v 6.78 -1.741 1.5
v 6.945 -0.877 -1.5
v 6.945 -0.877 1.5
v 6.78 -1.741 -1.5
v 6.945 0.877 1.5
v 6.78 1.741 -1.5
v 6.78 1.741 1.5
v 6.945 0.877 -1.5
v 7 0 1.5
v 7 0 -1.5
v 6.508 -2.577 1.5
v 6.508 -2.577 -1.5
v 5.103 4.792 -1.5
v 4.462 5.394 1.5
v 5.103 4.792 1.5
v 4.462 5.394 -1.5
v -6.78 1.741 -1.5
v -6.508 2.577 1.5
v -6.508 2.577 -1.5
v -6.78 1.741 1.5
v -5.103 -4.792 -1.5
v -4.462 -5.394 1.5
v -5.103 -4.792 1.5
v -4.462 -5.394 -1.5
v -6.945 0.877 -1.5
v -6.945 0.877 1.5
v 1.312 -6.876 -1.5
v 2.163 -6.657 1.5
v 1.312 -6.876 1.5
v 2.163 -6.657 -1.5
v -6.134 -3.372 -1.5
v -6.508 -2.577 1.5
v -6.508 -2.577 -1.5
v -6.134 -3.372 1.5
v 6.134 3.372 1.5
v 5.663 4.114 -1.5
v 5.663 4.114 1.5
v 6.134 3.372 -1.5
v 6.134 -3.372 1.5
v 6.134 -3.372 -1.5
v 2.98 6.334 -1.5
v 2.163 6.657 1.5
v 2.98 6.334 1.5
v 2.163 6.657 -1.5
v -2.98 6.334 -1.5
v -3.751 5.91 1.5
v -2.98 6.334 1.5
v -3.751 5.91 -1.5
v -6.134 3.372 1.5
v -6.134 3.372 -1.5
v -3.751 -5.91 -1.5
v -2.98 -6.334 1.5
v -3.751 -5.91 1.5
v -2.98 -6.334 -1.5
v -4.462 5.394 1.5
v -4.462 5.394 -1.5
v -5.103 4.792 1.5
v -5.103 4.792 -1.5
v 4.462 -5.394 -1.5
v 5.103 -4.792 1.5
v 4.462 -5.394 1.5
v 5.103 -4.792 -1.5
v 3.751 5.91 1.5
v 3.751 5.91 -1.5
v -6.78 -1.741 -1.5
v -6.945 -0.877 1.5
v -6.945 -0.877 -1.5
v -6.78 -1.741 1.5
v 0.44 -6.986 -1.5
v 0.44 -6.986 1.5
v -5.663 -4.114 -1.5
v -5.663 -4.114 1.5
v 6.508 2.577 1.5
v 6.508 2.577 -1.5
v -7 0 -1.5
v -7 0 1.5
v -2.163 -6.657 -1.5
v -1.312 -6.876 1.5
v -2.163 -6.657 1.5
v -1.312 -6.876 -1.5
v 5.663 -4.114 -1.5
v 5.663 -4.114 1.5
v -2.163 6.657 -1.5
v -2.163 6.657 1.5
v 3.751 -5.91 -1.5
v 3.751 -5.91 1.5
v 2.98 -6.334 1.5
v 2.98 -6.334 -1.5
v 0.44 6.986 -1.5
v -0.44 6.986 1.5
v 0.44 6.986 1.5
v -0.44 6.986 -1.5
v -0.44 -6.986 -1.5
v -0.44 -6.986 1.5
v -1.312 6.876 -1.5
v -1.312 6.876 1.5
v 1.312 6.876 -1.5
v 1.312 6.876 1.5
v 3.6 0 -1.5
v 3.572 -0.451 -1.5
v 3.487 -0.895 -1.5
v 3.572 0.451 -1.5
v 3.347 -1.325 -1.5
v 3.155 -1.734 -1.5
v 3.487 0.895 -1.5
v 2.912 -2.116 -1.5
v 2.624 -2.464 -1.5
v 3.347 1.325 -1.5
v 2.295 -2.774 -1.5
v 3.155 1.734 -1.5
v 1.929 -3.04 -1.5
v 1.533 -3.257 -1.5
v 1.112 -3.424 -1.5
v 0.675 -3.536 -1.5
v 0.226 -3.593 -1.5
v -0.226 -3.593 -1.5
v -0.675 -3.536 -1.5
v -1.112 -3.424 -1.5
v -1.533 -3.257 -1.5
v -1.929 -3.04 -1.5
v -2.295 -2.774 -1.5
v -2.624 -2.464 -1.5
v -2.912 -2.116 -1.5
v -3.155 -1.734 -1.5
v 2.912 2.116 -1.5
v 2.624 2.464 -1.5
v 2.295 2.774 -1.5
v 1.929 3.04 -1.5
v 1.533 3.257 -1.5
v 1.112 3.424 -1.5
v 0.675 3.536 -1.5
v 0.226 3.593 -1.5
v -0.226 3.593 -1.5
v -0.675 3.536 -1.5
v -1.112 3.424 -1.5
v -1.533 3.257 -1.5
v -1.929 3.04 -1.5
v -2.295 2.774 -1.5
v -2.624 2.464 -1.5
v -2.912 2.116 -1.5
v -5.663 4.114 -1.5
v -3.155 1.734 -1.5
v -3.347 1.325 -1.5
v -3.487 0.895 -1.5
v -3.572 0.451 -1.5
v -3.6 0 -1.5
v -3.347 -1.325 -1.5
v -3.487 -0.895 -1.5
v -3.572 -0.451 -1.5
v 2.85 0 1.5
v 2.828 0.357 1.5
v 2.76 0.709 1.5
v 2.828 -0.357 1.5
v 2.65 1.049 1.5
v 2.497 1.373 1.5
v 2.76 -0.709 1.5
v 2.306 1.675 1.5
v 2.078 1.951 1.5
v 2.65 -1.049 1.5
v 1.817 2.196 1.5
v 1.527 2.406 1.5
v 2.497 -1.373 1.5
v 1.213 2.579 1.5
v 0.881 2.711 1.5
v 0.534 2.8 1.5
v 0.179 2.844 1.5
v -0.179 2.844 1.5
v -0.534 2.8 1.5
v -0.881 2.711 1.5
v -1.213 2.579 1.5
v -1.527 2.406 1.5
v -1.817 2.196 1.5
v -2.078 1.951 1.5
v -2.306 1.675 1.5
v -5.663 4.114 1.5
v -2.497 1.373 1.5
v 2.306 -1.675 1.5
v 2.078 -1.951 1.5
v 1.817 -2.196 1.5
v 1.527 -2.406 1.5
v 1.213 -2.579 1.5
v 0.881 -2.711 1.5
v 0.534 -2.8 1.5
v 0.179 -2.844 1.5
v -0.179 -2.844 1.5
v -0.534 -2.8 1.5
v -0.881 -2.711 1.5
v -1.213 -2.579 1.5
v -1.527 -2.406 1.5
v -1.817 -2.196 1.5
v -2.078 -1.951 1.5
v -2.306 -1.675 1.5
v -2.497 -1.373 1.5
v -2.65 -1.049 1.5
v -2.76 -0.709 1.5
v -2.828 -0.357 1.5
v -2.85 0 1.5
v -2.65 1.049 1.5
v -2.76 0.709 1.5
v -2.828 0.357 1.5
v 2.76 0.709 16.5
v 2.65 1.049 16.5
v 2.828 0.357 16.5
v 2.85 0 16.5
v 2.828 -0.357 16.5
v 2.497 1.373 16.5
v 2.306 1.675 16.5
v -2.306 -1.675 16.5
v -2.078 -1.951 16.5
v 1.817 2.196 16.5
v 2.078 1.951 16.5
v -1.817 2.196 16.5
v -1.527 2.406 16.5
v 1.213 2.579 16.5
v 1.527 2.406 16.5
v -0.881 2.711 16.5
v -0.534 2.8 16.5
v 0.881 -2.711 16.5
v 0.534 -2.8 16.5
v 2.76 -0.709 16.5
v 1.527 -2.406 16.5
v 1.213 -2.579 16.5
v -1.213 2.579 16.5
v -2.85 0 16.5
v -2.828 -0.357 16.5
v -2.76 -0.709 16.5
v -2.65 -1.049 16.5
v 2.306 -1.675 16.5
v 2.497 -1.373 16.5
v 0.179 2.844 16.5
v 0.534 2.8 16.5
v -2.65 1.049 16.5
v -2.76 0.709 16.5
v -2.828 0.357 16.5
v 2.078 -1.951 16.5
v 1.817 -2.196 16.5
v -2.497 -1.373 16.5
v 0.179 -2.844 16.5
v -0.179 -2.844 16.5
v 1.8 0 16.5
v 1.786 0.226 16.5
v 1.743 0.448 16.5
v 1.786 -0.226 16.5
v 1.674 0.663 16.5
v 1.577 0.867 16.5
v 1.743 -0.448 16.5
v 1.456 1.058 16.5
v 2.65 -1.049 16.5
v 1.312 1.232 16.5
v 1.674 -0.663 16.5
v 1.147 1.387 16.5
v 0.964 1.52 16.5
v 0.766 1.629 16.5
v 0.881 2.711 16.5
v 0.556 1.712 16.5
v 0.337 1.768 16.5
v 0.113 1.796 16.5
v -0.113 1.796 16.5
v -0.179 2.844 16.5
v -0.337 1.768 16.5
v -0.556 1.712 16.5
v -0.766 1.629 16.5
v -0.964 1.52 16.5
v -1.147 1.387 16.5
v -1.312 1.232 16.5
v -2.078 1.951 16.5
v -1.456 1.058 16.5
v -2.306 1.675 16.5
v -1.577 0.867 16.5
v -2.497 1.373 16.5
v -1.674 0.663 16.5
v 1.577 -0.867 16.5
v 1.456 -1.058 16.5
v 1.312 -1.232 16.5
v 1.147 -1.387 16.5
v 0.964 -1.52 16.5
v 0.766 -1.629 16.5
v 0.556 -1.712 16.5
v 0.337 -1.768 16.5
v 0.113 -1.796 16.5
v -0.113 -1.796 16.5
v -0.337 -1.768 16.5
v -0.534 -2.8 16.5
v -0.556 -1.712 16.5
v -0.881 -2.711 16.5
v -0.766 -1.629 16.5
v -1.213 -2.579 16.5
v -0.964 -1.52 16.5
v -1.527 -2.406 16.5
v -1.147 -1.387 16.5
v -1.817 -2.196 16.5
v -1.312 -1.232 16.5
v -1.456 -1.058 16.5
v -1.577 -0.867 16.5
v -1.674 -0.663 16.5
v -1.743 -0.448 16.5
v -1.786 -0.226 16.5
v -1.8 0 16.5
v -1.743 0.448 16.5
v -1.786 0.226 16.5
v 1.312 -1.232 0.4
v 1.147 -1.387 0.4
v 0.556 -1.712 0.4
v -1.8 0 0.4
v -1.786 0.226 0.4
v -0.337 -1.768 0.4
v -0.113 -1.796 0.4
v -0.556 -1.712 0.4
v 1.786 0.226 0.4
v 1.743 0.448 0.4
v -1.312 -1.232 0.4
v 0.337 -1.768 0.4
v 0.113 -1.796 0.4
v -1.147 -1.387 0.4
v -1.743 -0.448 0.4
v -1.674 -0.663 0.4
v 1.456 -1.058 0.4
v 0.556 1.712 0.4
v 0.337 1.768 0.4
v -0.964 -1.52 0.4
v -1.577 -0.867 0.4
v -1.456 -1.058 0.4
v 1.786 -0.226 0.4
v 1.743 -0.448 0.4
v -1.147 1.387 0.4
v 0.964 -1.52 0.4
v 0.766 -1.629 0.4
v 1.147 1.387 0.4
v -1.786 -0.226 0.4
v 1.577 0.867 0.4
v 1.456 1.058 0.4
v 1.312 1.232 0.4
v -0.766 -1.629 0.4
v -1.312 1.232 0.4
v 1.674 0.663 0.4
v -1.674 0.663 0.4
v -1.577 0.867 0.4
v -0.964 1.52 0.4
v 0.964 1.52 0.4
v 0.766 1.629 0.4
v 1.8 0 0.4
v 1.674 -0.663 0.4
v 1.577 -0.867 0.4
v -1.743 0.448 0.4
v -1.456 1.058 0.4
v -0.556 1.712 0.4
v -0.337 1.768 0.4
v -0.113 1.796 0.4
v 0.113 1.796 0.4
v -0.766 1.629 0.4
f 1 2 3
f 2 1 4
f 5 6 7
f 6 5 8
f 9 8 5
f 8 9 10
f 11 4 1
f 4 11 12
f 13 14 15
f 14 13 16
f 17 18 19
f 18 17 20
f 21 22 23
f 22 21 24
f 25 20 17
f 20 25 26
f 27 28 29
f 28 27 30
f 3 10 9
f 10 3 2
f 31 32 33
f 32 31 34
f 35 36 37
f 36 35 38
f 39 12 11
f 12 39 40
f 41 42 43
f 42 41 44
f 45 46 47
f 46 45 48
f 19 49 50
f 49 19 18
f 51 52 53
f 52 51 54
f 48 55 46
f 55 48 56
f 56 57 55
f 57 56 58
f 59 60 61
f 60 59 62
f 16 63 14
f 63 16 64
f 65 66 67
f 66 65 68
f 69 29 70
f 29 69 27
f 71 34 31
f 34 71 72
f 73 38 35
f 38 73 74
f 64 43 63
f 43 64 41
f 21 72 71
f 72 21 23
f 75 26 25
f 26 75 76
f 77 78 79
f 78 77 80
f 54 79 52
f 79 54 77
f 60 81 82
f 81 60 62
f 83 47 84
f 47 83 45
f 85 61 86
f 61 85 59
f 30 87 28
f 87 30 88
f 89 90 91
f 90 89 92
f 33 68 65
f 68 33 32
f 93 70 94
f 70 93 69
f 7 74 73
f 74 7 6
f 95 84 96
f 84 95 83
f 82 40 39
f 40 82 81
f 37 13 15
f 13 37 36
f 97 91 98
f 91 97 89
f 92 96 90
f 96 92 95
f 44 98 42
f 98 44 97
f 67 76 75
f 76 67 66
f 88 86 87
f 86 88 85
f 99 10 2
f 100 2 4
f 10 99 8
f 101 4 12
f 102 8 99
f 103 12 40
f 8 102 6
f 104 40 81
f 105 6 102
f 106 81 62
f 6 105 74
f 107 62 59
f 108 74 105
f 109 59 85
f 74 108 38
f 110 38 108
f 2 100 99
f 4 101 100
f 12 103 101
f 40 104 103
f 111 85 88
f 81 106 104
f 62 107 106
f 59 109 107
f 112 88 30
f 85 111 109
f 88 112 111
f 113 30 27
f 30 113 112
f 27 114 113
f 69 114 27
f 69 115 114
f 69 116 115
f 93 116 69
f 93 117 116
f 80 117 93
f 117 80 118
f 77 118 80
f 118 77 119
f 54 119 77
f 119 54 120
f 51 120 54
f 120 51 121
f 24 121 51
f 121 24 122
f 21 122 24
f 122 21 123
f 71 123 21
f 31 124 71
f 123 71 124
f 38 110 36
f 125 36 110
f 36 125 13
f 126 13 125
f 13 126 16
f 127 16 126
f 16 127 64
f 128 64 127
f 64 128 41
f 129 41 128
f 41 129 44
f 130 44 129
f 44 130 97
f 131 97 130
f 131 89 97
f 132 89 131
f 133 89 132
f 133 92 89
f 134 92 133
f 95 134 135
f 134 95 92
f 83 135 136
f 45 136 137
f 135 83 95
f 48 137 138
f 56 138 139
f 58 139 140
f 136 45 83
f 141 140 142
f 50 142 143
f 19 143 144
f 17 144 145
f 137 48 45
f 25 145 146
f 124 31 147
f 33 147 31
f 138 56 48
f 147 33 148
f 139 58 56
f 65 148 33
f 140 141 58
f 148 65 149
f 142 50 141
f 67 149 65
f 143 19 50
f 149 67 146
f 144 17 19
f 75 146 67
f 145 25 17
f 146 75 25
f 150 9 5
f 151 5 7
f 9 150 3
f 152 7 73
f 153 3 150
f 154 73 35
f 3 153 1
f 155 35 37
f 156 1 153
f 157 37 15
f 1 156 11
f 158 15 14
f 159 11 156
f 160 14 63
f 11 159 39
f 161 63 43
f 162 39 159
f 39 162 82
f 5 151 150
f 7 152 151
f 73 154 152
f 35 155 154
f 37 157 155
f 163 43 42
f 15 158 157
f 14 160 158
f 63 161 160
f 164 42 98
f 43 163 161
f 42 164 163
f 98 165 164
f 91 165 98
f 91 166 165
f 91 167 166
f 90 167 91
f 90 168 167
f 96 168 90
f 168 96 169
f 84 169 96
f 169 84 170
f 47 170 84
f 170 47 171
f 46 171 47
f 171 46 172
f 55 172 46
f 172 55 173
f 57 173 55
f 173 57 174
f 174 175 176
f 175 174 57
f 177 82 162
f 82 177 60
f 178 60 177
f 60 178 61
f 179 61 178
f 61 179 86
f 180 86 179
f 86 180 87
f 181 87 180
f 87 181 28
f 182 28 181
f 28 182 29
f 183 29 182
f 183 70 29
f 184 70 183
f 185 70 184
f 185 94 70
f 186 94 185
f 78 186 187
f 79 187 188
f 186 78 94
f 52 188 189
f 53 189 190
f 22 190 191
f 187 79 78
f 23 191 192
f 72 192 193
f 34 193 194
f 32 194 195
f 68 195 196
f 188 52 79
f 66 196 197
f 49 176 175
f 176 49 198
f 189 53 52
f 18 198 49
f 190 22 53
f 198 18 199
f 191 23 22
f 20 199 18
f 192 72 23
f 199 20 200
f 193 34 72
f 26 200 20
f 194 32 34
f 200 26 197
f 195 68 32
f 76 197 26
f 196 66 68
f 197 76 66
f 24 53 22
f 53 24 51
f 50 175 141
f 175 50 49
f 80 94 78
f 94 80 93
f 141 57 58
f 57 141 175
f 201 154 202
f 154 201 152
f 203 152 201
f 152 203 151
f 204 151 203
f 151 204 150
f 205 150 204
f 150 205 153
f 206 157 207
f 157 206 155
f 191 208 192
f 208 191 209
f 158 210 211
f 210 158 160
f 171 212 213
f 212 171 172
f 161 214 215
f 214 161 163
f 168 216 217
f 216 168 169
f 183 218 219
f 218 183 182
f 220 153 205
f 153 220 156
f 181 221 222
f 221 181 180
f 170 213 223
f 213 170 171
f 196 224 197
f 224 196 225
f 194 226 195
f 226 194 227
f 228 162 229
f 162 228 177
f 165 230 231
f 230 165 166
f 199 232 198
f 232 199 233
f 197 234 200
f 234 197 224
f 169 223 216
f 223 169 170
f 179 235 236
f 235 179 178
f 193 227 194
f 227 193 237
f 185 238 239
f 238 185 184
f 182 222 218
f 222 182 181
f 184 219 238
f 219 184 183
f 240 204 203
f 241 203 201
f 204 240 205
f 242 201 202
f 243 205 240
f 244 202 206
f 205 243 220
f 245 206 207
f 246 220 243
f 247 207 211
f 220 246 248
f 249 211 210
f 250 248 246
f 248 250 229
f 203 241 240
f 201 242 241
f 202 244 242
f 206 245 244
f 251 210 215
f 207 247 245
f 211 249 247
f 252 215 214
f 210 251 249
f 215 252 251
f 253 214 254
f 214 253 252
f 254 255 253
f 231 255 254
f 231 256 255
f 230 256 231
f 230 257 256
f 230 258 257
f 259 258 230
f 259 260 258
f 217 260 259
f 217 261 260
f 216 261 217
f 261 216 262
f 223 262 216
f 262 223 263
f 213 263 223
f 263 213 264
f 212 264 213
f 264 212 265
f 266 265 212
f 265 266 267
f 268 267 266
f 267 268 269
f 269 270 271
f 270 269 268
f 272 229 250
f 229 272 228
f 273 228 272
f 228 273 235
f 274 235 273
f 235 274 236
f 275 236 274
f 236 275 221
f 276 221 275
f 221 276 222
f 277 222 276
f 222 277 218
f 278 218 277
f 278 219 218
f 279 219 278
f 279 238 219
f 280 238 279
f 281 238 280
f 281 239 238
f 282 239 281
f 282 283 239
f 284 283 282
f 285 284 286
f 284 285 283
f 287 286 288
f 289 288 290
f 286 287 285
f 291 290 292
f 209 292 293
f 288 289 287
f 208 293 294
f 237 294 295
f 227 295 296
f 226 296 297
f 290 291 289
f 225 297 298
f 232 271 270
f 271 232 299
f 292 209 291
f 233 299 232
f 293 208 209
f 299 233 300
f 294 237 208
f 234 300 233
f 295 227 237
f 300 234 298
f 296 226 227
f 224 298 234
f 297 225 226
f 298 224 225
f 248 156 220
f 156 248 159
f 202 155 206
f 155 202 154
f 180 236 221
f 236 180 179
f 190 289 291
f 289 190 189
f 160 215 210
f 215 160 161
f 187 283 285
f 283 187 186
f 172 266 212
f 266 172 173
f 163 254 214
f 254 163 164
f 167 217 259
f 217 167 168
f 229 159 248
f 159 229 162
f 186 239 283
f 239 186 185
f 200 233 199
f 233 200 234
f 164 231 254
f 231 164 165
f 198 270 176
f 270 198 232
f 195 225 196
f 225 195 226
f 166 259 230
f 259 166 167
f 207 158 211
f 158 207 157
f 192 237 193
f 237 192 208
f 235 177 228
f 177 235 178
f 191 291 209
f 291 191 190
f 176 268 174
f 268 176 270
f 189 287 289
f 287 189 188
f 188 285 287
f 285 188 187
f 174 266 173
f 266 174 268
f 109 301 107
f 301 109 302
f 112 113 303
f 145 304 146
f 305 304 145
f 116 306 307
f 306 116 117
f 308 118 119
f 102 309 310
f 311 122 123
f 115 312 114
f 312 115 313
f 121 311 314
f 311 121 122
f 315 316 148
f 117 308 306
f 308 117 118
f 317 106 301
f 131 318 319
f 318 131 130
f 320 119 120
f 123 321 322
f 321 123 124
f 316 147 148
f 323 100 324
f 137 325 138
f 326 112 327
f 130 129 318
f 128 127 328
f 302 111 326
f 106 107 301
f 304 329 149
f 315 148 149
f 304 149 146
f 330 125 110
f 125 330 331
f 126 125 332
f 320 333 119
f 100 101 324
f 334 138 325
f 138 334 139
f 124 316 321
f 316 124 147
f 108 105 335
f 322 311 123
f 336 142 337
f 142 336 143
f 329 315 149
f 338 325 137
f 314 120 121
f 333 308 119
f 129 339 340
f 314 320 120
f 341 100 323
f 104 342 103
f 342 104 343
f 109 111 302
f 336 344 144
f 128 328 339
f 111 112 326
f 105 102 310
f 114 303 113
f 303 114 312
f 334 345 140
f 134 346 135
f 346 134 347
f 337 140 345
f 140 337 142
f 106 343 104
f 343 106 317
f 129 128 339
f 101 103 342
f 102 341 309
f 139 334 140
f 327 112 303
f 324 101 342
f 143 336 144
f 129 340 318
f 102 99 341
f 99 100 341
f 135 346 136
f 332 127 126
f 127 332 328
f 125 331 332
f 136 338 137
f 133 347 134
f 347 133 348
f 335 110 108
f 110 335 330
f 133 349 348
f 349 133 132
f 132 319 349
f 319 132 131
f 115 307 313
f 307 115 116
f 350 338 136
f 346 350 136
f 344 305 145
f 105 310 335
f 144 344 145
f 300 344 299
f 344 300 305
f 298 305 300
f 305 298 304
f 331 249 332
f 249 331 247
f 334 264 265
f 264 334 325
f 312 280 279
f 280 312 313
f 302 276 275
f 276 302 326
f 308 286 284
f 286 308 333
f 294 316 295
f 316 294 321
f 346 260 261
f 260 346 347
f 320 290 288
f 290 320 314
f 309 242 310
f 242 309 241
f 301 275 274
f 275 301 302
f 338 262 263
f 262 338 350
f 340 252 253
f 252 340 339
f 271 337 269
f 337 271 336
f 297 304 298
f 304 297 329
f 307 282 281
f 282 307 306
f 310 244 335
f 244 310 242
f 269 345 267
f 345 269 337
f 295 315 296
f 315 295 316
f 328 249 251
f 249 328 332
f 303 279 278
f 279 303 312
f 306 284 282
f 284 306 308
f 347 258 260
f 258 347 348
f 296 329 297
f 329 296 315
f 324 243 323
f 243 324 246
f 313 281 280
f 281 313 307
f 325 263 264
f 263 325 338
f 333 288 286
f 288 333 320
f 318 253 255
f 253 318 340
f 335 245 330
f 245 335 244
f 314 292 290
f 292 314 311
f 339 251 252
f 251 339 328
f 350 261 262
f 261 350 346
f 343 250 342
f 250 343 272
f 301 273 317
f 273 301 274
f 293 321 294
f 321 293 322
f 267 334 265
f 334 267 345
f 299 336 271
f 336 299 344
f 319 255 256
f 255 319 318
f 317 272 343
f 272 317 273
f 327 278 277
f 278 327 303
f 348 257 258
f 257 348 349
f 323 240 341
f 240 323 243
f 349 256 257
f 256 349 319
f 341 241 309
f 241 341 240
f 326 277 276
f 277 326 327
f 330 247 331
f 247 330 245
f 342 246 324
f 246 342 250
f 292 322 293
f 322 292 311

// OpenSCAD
$fn = 50;


difference() {
	union() {
		translate(v = [0, 0, -1.5000000000]) {
			cylinder(h = 3, r = 7.0000000000);
		}
		translate(v = [0, 0, -1.5000000000]) {
			cylinder(h = 18, r = 2.8500000000);
		}
	}
	union() {
		translate(v = [0, 0, -1.5000000000]) {
			rotate(a = [0, 180, 0]) {
				difference() {
					union() {
						translate(v = [0, 0, -18.0000000000]) {
							cylinder(h = 18, r = 1.5000000000);
						}
						translate(v = [0, 0, -1.9000000000]) {
							cylinder(h = 1.9000000000, r1 = 1.8000000000, r2 = 3.6000000000);
						}
						translate(v = [0, 0, -18.0000000000]) {
							cylinder(h = 18, r = 1.8000000000);
						}
						translate(v = [0, 0, -18.0000000000]) {
							cylinder(h = 18, r = 1.5000000000);
						}
					}
					union();
				}
			}
		}
		translate(v = [0, 0, -100.0000000000]) {
			cylinder(h = 200, r = 1.8000000000);
		}
	}
}
